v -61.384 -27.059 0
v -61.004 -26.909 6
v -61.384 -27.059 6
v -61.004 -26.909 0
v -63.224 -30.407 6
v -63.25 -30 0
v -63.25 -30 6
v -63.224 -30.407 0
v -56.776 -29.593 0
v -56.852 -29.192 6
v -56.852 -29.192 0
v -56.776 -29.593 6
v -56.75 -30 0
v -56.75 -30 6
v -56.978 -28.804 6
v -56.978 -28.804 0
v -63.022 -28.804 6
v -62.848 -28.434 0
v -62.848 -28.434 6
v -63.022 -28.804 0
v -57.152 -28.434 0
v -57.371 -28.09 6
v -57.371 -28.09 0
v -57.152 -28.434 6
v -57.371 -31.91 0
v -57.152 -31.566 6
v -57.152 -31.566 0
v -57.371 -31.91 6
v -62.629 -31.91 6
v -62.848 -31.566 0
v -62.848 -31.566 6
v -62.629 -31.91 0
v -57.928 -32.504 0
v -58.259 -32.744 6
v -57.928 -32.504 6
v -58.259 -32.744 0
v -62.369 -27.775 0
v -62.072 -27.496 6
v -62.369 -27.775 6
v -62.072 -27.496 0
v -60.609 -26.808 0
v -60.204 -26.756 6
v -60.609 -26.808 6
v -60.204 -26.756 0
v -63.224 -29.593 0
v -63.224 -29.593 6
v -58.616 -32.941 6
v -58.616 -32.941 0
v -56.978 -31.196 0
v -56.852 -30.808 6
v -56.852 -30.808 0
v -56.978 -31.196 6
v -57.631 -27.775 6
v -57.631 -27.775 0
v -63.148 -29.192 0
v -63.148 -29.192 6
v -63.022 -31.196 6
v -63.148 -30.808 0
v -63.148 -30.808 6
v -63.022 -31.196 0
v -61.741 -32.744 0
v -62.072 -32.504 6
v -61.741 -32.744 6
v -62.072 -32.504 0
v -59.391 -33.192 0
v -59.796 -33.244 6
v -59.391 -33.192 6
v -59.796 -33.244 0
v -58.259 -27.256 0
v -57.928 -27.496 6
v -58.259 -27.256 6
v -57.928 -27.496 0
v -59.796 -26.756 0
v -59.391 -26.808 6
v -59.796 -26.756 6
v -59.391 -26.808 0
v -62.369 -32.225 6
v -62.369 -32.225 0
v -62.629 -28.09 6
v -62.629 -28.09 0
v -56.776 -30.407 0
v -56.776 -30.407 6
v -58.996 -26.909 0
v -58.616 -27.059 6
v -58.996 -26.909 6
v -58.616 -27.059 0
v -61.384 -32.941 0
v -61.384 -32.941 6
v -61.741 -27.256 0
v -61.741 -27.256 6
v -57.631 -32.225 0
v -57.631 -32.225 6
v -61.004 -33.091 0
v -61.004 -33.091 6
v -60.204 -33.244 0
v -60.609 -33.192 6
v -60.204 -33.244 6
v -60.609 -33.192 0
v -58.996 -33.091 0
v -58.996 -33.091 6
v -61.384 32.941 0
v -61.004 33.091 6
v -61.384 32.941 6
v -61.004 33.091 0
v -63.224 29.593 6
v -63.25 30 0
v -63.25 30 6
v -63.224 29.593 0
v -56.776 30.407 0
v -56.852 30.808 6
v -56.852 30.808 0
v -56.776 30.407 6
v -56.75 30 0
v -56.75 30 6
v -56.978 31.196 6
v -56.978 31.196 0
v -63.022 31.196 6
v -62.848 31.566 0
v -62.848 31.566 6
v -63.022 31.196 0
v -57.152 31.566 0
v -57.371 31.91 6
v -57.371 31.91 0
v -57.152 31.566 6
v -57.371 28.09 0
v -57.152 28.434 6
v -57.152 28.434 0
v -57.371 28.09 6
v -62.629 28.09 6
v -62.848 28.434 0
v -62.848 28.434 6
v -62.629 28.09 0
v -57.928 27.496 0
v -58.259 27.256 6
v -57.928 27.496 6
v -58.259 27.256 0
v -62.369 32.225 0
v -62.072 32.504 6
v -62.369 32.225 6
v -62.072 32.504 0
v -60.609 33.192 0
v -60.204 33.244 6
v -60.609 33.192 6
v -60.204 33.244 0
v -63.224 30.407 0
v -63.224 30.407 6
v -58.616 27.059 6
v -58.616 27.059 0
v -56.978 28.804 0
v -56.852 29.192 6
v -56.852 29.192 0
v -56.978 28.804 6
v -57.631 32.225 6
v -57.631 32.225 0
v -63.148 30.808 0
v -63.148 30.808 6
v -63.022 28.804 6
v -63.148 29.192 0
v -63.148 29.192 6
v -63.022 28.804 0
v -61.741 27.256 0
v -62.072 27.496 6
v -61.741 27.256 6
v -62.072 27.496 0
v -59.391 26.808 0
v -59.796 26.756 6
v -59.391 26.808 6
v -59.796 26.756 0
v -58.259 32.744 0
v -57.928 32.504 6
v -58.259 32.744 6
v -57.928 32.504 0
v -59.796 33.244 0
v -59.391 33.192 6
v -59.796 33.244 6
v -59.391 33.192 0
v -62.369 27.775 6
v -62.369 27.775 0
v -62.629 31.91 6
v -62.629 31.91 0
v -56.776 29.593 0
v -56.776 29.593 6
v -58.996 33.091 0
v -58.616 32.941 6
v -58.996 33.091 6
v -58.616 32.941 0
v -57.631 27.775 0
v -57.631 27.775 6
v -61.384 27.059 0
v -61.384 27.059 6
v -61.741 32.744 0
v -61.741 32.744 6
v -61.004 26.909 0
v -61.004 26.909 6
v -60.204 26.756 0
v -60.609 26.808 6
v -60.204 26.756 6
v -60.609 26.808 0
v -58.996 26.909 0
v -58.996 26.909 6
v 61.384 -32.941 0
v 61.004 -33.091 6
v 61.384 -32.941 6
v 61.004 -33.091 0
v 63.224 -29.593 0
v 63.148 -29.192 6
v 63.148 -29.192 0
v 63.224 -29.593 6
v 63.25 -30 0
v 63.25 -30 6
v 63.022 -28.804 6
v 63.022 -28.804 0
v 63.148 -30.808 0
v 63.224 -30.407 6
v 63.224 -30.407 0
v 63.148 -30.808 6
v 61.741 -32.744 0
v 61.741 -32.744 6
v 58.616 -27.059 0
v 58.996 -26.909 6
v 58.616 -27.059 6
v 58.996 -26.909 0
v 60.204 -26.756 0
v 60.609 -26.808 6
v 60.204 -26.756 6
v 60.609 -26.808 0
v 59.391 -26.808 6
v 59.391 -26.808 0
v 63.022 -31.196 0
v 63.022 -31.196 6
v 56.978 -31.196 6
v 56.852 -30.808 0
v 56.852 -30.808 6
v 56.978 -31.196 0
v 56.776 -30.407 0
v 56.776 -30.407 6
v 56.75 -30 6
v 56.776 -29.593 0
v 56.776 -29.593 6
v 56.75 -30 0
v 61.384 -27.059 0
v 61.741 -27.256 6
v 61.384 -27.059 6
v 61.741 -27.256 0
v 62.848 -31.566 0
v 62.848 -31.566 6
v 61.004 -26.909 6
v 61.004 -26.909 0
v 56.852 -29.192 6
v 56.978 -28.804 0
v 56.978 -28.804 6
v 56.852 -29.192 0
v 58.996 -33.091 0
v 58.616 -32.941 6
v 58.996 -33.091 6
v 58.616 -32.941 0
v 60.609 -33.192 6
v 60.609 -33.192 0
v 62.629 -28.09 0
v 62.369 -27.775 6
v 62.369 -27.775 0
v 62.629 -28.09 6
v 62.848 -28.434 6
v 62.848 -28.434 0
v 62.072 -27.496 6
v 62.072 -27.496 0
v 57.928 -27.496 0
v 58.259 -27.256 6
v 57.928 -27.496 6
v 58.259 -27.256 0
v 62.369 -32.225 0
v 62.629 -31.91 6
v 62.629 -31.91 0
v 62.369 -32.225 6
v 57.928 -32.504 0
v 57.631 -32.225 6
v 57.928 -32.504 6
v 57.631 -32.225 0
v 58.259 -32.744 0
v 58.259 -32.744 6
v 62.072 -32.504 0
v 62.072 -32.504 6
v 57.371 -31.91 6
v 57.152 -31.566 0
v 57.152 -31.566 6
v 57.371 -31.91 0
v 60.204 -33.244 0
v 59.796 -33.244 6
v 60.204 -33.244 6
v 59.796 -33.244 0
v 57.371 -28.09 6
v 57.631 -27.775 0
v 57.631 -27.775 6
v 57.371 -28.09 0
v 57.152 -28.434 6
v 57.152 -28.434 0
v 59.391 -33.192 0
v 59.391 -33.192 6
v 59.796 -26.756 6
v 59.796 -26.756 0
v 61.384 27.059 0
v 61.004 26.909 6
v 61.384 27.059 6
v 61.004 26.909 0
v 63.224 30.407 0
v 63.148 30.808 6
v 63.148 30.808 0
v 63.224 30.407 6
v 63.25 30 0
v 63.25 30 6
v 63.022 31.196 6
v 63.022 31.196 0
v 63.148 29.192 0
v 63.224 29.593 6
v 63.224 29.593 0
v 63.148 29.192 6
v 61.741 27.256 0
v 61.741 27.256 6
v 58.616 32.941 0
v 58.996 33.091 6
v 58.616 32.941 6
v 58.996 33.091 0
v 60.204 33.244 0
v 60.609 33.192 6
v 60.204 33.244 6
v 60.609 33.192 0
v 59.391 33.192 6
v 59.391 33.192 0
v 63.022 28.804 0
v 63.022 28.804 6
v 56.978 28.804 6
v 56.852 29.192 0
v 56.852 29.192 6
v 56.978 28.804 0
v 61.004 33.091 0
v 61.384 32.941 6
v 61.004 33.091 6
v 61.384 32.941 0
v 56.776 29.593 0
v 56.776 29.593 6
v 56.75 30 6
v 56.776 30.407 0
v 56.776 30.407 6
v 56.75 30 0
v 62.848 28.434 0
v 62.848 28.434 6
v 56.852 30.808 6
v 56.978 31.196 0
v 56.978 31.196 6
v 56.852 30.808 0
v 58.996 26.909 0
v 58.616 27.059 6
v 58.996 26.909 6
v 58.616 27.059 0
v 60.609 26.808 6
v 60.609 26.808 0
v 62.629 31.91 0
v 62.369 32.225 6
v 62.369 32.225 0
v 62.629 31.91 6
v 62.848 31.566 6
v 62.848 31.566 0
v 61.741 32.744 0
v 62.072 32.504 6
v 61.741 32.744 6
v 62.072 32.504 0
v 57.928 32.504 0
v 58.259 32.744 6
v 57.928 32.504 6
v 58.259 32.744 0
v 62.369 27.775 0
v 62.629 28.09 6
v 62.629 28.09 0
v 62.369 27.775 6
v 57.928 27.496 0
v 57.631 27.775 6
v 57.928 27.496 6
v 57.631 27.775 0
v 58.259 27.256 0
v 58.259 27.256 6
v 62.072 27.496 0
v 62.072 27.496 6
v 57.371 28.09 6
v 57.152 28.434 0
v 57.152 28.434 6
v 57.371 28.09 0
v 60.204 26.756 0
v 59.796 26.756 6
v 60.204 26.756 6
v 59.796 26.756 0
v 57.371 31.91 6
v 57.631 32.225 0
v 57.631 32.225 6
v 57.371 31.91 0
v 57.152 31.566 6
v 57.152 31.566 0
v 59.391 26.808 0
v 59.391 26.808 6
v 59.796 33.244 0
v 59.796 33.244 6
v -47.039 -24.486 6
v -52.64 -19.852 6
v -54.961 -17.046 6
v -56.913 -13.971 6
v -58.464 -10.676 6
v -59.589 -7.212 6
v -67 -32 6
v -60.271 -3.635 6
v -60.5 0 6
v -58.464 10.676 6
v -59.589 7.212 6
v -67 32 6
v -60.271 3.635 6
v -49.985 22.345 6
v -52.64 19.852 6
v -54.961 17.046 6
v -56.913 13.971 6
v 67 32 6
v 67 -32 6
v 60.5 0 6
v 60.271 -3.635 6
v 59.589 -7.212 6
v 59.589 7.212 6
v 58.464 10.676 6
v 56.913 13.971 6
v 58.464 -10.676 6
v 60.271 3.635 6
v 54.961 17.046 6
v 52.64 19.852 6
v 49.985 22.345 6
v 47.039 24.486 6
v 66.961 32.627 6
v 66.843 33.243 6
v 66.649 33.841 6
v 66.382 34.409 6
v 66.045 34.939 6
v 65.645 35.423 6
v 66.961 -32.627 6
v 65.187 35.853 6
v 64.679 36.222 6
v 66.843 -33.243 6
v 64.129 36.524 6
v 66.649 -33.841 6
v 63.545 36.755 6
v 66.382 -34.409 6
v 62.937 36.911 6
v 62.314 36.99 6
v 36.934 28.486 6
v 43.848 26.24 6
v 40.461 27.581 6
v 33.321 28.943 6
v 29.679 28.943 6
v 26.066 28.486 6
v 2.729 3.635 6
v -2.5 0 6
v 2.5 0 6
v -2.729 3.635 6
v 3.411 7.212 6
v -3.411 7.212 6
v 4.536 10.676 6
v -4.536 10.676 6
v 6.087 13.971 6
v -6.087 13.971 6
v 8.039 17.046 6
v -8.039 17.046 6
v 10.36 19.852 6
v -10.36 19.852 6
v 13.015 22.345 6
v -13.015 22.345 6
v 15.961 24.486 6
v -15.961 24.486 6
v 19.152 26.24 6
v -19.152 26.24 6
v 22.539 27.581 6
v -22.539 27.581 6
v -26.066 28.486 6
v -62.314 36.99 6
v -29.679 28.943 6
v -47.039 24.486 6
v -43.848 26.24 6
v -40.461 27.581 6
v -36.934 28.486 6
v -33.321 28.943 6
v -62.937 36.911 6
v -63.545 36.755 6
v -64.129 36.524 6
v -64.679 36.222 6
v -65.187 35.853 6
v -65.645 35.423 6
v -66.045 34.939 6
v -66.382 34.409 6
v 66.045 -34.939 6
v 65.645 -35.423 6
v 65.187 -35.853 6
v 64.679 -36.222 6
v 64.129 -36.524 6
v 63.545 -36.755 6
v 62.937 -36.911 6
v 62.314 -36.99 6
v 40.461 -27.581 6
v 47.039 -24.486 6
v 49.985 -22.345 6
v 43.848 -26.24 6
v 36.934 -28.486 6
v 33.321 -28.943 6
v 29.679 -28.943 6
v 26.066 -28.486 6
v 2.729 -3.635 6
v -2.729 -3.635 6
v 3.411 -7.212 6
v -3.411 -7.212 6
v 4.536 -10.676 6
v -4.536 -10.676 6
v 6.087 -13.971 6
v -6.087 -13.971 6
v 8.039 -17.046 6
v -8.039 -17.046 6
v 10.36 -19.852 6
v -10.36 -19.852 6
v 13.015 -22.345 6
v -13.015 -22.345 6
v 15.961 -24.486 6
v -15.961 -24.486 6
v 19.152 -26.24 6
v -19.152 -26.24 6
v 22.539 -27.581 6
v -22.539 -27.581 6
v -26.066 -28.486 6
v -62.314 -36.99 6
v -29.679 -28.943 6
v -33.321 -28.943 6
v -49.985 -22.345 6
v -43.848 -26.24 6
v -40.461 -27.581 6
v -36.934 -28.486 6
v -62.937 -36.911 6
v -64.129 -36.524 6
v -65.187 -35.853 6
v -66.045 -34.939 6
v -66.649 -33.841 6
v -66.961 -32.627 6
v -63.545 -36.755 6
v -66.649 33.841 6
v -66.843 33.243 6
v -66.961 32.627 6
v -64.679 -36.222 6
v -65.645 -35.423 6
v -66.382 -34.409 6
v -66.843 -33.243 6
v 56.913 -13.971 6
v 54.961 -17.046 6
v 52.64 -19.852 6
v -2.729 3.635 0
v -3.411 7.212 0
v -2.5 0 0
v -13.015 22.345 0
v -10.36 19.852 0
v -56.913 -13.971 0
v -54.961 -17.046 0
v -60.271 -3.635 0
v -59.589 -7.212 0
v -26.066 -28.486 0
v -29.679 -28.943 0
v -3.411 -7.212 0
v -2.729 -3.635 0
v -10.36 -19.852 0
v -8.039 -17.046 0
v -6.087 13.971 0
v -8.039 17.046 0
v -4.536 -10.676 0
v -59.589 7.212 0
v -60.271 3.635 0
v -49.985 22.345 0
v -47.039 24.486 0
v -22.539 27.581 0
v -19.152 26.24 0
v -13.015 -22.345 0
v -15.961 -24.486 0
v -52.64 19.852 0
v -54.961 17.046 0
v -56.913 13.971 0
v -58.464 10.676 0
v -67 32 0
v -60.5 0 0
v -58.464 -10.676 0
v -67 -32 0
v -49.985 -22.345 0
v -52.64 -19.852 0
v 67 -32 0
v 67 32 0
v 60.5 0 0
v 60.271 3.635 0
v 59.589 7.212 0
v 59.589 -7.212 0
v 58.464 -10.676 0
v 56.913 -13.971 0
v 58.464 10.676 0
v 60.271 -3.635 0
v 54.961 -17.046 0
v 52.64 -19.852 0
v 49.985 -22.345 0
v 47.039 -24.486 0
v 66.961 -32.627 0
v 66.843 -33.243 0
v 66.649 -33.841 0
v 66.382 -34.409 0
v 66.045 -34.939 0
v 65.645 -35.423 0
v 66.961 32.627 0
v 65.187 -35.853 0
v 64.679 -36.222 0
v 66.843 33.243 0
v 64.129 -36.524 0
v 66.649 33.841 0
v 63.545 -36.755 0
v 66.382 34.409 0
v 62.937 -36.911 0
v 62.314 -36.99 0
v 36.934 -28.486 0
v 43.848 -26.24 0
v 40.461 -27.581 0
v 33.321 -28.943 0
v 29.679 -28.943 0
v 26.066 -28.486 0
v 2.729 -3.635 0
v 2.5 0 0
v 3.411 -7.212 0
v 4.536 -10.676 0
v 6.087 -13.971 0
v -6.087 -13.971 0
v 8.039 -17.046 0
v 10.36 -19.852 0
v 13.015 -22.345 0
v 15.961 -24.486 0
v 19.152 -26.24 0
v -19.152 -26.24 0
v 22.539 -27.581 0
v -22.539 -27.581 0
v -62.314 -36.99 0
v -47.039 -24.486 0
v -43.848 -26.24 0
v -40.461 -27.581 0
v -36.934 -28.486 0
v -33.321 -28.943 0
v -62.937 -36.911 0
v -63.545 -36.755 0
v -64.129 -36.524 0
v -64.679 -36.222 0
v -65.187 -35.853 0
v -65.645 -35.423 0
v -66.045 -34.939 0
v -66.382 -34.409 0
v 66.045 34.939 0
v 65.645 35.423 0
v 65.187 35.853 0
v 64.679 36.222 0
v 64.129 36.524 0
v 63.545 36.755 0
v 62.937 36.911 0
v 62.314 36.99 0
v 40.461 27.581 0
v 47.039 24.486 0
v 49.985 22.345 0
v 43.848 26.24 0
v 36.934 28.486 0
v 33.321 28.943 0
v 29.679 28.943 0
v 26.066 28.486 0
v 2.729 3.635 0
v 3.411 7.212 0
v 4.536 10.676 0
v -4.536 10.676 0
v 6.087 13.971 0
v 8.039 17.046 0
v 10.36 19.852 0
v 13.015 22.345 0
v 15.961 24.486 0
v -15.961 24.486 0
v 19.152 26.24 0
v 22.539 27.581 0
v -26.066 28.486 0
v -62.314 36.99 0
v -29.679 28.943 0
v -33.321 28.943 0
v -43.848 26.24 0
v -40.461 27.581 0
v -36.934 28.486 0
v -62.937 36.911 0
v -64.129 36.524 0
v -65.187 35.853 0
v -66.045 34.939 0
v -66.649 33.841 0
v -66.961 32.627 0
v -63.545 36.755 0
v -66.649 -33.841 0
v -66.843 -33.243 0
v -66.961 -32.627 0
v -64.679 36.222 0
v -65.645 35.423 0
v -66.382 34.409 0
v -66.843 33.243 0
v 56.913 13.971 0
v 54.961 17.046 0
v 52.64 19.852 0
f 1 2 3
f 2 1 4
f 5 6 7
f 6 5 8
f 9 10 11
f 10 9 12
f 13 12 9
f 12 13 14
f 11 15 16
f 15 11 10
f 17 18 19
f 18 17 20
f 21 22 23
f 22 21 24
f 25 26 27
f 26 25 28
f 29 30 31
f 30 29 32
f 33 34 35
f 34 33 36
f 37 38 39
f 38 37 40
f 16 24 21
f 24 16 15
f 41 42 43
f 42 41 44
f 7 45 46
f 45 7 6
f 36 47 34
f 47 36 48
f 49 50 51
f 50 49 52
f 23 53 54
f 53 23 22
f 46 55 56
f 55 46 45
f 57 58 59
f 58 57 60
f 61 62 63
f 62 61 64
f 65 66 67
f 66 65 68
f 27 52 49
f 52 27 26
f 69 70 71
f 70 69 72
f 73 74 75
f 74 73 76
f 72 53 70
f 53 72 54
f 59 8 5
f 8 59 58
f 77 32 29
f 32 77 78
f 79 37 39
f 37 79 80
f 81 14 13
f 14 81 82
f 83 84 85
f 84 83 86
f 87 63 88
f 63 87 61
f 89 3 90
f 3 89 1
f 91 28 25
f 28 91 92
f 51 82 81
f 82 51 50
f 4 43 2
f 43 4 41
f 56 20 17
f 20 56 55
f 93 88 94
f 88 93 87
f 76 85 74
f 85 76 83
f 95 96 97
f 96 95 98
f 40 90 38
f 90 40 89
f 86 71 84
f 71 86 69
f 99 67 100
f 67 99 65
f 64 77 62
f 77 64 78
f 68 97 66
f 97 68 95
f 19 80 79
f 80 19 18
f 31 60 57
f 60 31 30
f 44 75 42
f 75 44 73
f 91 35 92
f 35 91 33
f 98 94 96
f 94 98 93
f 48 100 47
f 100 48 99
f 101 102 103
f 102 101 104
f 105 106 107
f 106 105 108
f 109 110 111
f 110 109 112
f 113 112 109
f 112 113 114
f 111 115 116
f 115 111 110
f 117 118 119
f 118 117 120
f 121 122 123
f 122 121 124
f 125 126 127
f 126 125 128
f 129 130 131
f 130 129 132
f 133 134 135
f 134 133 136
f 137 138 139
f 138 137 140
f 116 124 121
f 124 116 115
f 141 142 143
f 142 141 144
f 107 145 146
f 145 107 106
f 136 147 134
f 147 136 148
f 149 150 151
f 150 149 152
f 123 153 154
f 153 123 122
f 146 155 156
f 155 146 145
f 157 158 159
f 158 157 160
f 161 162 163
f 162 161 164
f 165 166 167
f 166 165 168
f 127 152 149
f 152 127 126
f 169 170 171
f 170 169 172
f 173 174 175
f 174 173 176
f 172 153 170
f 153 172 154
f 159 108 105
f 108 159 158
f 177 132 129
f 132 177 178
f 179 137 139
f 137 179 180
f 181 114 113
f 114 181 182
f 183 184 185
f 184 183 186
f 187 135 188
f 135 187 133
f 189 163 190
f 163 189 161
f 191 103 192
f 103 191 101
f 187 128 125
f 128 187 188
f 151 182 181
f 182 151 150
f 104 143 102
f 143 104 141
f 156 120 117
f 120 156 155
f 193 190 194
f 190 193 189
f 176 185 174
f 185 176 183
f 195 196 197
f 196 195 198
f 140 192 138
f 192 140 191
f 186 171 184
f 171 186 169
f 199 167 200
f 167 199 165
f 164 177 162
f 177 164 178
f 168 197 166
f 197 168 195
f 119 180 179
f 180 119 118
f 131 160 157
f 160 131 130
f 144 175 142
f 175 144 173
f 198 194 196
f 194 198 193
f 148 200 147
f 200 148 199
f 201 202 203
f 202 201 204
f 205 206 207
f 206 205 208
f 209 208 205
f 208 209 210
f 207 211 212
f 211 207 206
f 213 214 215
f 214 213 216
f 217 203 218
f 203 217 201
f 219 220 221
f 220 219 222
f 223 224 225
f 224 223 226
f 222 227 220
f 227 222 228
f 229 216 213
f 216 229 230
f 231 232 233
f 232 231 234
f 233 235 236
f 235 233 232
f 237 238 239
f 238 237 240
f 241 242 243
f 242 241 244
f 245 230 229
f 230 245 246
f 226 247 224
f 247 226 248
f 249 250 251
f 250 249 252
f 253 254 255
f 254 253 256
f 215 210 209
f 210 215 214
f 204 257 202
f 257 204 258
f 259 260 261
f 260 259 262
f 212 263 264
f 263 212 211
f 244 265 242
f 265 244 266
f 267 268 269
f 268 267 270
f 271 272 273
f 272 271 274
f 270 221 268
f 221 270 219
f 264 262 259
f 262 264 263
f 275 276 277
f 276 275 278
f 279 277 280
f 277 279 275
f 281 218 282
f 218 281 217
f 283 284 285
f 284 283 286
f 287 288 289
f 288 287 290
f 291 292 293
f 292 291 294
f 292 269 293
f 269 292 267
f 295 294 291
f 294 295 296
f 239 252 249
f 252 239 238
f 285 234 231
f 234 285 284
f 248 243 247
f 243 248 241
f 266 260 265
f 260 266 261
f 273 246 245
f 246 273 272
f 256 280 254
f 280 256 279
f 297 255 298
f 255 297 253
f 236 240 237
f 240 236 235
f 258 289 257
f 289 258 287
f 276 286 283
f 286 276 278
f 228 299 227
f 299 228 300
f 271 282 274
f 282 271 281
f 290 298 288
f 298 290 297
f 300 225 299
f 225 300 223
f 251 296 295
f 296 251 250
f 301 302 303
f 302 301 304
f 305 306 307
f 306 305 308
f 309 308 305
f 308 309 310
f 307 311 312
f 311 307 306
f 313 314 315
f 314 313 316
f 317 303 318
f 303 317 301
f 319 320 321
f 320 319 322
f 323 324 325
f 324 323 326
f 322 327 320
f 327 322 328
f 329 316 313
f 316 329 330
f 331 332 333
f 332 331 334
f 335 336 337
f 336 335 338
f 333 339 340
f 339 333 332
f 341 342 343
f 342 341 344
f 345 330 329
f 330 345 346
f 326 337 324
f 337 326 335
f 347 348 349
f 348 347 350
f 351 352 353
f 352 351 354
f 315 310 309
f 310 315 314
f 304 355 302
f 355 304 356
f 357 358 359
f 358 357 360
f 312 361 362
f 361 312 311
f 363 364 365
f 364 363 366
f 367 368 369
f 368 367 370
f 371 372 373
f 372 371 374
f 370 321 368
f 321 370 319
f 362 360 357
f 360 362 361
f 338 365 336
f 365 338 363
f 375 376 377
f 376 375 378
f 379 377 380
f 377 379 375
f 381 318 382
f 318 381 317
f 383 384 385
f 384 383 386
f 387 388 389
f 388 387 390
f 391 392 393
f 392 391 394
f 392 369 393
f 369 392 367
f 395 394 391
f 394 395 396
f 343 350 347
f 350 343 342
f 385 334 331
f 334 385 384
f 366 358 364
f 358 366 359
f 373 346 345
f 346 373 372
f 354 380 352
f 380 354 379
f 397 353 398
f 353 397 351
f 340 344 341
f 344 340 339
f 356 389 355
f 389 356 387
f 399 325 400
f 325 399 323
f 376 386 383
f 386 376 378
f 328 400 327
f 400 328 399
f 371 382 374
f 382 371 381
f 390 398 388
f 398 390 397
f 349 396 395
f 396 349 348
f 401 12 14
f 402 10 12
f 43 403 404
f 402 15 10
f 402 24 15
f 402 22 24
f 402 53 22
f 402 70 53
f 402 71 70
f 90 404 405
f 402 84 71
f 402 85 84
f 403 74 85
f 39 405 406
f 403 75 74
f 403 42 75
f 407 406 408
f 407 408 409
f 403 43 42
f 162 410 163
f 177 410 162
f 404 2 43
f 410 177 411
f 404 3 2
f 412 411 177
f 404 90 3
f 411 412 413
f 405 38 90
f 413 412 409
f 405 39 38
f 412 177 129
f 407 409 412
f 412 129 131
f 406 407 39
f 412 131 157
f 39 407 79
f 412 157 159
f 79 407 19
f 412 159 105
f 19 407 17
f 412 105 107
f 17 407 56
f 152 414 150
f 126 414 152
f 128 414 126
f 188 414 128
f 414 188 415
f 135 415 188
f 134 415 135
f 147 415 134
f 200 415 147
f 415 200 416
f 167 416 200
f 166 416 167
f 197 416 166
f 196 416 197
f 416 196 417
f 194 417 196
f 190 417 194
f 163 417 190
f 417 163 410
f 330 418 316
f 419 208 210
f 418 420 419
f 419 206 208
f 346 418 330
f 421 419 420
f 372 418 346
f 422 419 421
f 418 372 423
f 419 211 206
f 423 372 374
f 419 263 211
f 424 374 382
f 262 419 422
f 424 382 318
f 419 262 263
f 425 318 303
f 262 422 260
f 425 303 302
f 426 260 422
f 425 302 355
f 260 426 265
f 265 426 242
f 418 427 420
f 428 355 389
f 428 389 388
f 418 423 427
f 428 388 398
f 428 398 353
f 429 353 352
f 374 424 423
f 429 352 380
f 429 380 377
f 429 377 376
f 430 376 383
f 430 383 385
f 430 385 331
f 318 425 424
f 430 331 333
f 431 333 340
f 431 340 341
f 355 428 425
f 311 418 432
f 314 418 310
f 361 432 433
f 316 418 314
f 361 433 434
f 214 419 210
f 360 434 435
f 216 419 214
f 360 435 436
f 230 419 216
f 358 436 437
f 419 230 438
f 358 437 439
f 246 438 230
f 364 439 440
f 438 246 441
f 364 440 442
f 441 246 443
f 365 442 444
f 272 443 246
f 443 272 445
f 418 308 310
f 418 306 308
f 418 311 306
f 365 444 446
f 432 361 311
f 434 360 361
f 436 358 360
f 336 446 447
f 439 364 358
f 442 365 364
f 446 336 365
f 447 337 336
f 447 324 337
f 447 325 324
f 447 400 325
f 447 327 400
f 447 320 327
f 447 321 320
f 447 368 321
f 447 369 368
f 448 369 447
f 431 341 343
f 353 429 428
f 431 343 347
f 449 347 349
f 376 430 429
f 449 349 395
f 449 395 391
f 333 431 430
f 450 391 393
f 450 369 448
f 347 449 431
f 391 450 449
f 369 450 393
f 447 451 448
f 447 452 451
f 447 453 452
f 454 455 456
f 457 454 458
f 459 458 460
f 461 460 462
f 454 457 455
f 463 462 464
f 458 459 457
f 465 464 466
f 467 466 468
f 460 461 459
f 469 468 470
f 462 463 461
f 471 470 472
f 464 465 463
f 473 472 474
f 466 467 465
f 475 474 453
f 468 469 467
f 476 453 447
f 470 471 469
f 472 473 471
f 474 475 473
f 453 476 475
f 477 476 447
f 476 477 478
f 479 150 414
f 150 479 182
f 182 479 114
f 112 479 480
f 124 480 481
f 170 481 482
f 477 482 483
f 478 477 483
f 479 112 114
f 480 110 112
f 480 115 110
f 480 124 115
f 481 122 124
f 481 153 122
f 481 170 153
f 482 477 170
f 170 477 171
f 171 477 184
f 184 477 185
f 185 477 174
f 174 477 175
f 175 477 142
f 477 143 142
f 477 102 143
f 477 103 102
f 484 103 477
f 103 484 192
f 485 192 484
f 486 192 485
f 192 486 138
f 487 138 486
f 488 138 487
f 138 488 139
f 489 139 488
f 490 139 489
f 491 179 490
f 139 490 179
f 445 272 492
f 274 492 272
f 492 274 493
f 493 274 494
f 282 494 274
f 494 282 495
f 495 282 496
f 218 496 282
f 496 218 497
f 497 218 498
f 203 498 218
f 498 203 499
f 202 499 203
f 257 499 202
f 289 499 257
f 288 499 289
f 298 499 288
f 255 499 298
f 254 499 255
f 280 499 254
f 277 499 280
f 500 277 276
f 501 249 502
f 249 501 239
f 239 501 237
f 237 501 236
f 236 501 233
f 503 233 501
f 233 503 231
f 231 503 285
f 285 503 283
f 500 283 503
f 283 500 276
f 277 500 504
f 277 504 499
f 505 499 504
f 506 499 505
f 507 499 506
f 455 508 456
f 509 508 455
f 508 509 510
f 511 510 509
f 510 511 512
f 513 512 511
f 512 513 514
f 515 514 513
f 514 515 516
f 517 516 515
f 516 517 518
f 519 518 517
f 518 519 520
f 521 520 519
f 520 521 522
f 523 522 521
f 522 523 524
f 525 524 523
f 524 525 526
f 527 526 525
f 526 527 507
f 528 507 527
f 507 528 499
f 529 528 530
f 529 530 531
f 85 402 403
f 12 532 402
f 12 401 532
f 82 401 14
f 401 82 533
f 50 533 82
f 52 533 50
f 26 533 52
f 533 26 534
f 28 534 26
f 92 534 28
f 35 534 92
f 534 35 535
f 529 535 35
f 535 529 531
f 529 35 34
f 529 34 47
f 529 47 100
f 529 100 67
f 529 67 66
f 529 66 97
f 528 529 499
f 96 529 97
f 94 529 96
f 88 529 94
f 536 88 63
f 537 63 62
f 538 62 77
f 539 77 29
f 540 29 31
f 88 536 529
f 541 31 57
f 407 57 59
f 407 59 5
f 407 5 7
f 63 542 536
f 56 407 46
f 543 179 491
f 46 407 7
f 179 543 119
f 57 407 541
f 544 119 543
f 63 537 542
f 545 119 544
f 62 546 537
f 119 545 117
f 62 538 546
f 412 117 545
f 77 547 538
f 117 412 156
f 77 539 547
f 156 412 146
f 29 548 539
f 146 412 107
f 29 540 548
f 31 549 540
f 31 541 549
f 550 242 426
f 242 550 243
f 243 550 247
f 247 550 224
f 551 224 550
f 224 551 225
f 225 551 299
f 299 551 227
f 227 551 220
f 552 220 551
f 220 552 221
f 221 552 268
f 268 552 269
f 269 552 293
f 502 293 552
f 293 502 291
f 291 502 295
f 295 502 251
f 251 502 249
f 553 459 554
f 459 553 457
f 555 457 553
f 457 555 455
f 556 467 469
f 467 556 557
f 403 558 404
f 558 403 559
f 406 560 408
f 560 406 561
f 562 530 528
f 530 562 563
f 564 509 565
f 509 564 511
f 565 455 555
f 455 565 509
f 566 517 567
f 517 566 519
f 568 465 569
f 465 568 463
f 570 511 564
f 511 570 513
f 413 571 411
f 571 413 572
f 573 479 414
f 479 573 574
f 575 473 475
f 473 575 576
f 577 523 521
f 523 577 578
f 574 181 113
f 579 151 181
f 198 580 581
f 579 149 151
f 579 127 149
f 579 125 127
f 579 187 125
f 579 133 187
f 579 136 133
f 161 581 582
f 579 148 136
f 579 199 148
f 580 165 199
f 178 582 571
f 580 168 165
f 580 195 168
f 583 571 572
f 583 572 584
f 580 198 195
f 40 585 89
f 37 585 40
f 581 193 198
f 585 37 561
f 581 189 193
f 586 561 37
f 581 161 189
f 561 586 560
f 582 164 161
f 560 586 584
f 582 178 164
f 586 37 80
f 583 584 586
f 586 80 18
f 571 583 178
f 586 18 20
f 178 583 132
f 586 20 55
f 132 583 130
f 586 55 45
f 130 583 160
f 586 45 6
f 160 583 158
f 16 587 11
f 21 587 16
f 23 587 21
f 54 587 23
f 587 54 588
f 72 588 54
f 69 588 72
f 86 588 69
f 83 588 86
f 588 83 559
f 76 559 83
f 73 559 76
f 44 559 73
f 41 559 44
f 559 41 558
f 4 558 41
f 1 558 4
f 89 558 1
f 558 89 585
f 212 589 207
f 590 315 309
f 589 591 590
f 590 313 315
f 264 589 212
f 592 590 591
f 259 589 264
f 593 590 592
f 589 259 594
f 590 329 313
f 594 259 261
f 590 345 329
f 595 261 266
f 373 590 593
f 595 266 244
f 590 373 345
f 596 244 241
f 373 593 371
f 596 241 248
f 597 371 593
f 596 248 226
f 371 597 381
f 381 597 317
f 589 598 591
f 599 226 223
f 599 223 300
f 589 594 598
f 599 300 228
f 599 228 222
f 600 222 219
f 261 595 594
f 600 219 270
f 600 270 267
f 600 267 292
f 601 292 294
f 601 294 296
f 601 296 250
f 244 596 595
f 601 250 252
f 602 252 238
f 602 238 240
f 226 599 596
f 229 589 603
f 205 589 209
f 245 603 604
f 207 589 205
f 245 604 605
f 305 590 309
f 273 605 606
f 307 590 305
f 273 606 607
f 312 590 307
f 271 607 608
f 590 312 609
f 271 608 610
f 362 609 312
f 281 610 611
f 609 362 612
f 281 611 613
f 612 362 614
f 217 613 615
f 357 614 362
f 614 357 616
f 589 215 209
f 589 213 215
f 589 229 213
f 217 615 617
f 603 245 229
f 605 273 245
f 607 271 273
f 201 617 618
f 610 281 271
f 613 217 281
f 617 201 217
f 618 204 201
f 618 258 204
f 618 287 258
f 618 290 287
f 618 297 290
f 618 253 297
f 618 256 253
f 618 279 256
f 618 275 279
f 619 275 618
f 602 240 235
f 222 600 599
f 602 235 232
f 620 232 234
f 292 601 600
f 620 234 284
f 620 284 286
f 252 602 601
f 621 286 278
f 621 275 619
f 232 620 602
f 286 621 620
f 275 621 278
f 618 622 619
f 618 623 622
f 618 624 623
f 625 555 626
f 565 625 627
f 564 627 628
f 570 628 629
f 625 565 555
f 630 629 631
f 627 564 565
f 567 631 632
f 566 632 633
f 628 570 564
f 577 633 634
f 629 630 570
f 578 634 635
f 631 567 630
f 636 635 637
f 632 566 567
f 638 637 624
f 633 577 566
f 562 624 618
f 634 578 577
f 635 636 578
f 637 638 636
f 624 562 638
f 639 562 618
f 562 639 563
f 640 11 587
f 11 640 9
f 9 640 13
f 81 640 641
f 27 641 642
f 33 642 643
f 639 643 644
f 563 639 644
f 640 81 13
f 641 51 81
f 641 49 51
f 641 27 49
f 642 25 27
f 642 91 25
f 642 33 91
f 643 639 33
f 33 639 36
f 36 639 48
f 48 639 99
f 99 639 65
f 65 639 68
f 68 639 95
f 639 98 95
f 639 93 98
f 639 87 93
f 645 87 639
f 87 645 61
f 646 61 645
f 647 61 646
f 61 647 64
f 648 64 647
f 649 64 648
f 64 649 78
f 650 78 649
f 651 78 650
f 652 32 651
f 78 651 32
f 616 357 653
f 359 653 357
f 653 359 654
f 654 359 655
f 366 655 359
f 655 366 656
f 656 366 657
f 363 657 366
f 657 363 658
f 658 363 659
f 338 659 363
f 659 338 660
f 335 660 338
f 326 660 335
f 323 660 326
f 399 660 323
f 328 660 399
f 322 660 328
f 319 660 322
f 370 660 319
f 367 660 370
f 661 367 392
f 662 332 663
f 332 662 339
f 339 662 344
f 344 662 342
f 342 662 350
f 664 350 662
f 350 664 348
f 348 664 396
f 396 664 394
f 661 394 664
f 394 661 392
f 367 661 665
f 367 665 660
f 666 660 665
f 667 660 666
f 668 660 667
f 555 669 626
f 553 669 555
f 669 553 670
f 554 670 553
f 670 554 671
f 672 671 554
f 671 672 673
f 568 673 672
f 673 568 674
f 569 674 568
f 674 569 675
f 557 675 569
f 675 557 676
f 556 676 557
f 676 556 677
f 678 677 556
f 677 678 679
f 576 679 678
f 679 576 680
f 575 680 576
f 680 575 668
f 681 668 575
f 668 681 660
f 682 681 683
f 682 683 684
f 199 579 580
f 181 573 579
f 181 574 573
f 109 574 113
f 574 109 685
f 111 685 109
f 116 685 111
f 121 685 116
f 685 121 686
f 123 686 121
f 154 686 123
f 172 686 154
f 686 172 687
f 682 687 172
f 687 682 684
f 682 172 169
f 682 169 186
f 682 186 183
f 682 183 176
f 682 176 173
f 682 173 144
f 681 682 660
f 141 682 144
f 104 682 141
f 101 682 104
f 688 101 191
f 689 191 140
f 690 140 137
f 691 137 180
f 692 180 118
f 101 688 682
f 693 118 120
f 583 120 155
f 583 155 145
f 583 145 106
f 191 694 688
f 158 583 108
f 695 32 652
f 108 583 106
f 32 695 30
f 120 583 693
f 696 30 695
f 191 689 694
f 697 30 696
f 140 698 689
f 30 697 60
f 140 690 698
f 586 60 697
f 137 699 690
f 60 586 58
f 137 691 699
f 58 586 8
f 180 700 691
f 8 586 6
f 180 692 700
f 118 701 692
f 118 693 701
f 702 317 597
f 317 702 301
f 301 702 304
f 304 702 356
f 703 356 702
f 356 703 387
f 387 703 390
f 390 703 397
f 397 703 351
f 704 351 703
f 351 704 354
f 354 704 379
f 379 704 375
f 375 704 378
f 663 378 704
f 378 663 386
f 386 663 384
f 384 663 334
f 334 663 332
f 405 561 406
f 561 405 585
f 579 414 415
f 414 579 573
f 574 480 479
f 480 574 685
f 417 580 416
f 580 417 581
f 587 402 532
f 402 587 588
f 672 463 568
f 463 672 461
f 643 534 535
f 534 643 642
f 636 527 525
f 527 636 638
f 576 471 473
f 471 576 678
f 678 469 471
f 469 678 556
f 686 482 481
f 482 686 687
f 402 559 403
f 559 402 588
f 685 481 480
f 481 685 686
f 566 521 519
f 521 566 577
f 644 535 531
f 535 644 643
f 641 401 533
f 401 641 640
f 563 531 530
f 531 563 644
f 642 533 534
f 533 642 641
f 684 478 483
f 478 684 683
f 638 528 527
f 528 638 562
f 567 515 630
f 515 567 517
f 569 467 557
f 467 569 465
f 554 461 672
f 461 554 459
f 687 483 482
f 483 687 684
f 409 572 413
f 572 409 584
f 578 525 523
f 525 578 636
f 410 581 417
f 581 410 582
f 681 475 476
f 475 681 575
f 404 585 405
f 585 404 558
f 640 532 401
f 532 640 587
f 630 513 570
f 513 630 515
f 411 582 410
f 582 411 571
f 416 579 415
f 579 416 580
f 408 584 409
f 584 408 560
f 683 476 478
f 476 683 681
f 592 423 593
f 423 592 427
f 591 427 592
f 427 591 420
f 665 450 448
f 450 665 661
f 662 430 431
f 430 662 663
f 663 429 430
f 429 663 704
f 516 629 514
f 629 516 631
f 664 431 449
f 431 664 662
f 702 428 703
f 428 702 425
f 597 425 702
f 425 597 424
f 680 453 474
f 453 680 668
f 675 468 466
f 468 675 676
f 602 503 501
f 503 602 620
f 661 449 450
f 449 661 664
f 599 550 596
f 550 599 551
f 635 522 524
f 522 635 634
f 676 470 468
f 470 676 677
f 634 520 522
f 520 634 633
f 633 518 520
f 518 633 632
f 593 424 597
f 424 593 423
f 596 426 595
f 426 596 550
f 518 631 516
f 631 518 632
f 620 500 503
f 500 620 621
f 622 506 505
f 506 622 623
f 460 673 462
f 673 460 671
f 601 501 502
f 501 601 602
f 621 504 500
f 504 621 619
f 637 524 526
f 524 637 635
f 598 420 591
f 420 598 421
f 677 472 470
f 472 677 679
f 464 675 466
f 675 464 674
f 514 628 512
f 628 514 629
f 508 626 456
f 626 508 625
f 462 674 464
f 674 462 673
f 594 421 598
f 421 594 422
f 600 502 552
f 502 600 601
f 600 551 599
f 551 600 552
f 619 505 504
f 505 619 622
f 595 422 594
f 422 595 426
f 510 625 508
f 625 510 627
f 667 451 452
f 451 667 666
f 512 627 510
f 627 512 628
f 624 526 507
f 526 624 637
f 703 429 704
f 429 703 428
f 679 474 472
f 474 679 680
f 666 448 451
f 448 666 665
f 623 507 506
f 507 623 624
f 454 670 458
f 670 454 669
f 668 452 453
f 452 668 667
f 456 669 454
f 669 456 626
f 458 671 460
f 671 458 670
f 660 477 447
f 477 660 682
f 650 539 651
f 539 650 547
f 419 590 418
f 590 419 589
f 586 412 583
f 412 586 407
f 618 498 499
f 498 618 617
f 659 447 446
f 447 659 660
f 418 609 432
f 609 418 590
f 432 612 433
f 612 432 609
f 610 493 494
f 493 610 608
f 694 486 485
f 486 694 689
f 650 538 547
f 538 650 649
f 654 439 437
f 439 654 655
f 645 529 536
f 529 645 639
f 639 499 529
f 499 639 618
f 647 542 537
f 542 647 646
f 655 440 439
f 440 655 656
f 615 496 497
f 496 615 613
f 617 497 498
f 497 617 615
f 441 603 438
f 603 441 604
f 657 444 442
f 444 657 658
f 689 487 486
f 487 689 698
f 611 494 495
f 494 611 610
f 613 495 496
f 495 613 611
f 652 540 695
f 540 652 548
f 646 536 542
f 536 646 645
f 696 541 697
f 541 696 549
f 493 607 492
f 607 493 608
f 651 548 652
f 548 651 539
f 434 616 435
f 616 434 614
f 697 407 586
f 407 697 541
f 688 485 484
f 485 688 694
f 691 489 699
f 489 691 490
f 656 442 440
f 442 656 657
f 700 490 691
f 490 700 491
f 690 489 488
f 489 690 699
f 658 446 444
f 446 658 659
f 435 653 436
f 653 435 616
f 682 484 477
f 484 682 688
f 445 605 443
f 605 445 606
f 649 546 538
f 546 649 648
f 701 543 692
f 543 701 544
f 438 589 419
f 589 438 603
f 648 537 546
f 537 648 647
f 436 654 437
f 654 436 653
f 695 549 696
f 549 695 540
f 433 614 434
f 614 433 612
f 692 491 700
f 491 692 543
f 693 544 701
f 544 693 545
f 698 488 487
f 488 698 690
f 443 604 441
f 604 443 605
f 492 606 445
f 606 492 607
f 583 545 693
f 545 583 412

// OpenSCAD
$fn = 50;

difference() {
	union() {
		hull() {
			translate(v = [-62.0, 32.0, 0]) {
				cylinder(h = 6, r = 5);
			}
			translate(v = [62.0, 32.0, 0]) {
				cylinder(h = 6, r = 5);
			}
			translate(v = [-62.0, -32.0, 0]) {
				cylinder(h = 6, r = 5);
			}
			translate(v = [62.0, -32.0, 0]) {
				cylinder(h = 6, r = 5);
			}
		}
	}
	union() {
		translate(v = [-60.0, -30.0, -100.0]) {
			cylinder(h = 200, r = 3.25);
		}
		translate(v = [-60.0, 30.0, -100.0]) {
			cylinder(h = 200, r = 3.25);
		}
		translate(v = [60.0, -30.0, -100.0]) {
			cylinder(h = 200, r = 3.25);
		}
		translate(v = [60.0, 30.0, -100.0]) {
			cylinder(h = 200, r = 3.25);
		}
		translate(v = [-60.0, -30.0, -100.0]) {
			cylinder(h = 200, r = 1.8);
		}
		translate(v = [-60.0, 30.0, -100.0]) {
			cylinder(h = 200, r = 1.8);
		}
		translate(v = [60.0, -30.0, -100.0]) {
			cylinder(h = 200, r = 1.8);
		}
		translate(v = [60.0, 30.0, -100.0]) {
			cylinder(h = 200, r = 1.8);
		}
		translate(v = [-31.5, 0, 0.0]) {
			cylinder(h = 6, r = 29.0);
		}
		translate(v = [31.5, 0, 0.0]) {
			cylinder(h = 6, r = 29.0);
		}
	}
}
